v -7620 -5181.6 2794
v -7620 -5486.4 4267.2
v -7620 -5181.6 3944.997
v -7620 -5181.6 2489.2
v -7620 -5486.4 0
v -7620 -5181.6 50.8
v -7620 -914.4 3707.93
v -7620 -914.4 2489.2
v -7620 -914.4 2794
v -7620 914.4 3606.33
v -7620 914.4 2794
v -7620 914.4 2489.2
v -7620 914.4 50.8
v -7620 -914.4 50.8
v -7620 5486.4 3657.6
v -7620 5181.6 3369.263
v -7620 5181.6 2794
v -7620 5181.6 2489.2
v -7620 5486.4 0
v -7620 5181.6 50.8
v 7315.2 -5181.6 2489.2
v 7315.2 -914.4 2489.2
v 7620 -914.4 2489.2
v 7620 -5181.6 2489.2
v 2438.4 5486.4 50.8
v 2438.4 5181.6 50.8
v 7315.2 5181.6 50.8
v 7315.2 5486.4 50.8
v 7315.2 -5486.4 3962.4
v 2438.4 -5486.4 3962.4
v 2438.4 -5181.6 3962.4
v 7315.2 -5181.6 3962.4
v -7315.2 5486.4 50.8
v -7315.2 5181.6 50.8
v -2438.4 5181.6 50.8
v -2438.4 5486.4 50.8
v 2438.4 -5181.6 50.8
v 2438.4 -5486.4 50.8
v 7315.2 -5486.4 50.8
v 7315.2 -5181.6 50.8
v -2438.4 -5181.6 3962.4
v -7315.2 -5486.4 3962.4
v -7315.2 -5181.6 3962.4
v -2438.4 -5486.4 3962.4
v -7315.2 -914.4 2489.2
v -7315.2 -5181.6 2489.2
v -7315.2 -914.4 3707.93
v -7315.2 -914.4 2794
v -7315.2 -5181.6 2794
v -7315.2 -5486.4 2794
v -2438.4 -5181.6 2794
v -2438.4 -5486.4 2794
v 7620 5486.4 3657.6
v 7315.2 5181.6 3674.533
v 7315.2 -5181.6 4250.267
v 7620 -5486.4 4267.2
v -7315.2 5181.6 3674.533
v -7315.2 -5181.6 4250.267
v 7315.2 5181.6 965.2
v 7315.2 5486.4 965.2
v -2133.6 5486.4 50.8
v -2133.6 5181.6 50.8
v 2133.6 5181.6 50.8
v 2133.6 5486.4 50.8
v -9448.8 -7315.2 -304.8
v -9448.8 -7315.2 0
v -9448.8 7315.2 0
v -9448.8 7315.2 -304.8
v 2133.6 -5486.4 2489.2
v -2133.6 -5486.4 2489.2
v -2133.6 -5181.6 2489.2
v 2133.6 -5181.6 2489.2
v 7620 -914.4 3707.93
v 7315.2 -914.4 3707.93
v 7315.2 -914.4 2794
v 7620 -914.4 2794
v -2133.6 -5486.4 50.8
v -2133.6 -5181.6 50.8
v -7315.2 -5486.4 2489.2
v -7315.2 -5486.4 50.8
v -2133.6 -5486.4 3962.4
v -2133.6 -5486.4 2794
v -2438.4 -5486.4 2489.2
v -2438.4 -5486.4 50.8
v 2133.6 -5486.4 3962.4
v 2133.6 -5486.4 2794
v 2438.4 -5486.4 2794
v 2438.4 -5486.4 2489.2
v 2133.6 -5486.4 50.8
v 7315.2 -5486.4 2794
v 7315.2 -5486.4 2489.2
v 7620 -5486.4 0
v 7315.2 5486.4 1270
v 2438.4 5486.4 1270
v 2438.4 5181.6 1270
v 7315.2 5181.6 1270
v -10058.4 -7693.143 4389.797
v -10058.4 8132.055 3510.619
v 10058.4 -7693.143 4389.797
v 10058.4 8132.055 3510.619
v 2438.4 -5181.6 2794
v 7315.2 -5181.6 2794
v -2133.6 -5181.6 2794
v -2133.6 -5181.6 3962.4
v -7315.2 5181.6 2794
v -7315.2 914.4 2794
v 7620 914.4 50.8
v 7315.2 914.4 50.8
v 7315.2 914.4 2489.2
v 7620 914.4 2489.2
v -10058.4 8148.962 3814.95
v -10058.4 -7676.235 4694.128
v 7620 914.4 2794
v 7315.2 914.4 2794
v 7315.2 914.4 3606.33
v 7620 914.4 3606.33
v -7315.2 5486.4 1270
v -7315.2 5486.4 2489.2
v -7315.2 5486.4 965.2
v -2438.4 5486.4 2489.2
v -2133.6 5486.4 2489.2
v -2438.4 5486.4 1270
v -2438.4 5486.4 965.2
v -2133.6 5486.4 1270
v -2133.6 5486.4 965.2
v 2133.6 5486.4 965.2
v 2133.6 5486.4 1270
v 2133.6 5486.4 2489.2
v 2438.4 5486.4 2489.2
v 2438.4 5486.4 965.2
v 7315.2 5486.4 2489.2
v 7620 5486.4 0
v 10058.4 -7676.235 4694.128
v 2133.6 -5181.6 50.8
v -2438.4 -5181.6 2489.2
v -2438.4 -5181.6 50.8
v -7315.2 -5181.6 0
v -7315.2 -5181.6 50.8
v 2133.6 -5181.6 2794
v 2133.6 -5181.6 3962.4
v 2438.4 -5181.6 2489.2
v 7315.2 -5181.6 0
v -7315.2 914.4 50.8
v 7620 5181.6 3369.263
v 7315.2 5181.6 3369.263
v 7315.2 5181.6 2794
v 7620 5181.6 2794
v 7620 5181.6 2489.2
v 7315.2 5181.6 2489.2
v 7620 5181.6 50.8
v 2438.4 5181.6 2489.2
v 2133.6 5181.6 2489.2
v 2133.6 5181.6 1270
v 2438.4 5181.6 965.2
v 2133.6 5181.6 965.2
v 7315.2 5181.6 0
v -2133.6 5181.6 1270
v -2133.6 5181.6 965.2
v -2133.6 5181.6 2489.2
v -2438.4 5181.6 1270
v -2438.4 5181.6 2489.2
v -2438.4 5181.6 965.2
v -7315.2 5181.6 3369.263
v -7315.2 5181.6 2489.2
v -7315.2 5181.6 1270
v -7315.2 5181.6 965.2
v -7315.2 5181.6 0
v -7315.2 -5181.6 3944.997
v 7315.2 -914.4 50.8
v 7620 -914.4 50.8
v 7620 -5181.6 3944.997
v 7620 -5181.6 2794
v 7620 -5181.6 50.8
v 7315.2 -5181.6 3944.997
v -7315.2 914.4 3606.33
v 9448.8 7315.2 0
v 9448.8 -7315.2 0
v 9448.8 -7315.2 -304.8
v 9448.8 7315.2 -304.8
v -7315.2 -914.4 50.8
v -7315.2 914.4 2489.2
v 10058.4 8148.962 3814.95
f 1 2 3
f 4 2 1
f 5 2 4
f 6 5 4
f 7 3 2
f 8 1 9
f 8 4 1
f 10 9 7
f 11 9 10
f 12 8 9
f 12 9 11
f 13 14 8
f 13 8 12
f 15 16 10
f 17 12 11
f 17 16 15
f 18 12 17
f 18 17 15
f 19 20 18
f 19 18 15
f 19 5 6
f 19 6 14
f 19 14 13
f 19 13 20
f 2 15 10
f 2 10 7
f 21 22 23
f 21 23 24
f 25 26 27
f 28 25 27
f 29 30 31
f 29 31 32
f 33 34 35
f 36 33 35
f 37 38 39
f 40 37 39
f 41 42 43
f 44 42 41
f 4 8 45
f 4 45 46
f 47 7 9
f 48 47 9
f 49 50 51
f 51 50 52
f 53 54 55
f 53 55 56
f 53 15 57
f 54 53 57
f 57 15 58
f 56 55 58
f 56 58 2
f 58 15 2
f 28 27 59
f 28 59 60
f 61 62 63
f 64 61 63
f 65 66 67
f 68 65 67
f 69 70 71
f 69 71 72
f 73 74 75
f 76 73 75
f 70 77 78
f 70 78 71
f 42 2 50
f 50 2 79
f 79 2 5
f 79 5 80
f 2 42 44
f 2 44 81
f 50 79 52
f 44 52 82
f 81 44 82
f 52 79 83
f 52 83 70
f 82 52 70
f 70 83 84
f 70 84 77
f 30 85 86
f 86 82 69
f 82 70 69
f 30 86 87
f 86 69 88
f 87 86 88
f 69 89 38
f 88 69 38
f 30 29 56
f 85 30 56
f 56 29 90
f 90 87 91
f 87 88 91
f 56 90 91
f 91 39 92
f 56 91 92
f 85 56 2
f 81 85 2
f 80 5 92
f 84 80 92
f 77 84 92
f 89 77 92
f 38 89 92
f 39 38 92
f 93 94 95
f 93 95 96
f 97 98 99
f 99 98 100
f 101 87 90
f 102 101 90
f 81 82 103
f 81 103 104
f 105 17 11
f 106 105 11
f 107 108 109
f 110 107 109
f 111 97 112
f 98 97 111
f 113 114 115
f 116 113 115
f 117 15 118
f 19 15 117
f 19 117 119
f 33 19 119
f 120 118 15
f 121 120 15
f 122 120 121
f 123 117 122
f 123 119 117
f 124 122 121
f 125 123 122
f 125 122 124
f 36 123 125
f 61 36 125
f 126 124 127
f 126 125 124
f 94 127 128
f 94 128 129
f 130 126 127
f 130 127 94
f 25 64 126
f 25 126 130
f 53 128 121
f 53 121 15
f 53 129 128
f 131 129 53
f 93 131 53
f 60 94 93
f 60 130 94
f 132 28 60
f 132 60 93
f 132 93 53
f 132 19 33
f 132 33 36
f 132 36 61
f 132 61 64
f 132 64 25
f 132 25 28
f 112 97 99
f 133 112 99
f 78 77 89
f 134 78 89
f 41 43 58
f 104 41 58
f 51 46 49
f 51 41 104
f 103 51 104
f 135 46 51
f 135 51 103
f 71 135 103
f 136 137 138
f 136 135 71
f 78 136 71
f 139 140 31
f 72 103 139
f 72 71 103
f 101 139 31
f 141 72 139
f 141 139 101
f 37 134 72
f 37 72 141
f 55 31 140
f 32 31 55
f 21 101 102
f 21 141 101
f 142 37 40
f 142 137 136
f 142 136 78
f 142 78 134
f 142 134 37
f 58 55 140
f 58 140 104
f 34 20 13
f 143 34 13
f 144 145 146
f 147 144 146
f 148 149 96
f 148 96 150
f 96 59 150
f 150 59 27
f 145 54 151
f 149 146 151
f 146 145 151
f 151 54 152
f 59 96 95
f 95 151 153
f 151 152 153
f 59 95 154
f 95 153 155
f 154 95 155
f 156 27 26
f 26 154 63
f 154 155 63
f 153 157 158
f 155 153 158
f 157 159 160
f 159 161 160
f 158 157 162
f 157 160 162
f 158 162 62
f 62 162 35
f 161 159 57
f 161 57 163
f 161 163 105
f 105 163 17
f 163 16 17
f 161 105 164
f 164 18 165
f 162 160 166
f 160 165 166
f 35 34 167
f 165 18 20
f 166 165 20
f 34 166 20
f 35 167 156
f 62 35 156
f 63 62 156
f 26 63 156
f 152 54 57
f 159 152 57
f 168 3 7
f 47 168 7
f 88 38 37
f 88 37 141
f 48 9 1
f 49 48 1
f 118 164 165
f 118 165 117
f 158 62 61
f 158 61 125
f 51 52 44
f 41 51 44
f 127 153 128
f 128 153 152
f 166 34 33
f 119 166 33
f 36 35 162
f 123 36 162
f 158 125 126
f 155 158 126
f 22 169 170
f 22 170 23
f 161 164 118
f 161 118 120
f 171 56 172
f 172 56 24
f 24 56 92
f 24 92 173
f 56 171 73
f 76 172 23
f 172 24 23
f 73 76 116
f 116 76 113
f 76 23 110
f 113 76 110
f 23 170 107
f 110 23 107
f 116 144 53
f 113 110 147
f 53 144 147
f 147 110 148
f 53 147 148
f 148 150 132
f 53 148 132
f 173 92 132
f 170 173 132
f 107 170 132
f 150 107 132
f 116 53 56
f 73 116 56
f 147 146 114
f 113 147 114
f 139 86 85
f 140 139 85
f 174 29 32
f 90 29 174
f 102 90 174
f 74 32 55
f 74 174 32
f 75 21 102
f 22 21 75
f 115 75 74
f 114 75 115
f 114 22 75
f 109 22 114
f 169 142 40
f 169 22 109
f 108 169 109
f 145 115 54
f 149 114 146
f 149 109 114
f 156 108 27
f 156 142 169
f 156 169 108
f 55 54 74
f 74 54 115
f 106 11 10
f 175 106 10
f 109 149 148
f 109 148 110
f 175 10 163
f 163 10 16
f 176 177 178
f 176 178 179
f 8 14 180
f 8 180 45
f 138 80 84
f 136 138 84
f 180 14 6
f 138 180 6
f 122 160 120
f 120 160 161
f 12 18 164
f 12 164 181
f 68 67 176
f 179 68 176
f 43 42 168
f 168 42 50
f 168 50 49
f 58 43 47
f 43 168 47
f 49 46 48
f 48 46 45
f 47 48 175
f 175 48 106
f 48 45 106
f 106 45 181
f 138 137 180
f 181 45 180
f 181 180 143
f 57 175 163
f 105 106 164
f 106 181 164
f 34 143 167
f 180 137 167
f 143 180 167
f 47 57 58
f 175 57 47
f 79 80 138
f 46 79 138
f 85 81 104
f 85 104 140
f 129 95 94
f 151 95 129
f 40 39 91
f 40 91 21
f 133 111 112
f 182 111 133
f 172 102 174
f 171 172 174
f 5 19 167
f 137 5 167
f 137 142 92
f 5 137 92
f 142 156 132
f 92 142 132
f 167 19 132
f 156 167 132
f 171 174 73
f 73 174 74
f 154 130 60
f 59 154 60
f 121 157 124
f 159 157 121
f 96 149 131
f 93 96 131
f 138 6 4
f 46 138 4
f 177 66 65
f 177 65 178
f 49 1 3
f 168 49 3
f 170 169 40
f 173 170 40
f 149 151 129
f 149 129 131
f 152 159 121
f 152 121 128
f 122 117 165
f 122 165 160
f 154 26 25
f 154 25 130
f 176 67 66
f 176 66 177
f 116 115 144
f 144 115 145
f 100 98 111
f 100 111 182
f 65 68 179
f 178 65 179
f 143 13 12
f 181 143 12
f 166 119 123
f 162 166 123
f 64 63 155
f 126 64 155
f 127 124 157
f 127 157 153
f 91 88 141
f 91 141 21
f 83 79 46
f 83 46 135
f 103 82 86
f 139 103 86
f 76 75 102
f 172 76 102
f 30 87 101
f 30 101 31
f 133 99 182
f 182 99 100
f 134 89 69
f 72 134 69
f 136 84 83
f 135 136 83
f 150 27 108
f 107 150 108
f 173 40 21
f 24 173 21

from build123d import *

# Parameters (mm, degrees)
F0_W      = 18897.6
F0_H      = 14630.4
F1_DEPTH  = 304.8
F2_W      = 15240
F2_H      = 10972.8
F3_DEPTH  = 4267.2
F5_DEPTH  = 15240
F6_T      = -304.8
F7_W      = 20116.8
F7_H      = 15849.6
F7_W_2    = 15240
F7_H_2    = 10989.7202876142
F7_W_3    = 14630.4
F7_H_3    = 10379.1802716357
F8_DEPTH  = 304.8
F9_W      = 4267.2
F9_H      = 2438.4
F9_W_2    = 4876.8
F10_DEPTH = 10972.8
F11_W     = 4267.2
F11_H     = 2438.4
F12_DEPTH = 15240
F13_W     = 4876.8
F13_H     = 1168.4
F13_W_2   = 4267.2
F14_DEPTH = 304.8
F16_DEPTH = 15240
F18_W     = 4876.8
F18_H     = 304.8000000003
F18_W_2   = 4267.2
F19_DEPTH = 304.8


with BuildPart() as f1:
    # F0 (on Top) → F1 (new body)
    with BuildSketch(Plane.XY):
        Rectangle(F0_W, F0_H)
    extrude(amount=-F1_DEPTH)


with BuildPart() as f3:
    # F2 (on face) → F3 (new body)
    with BuildSketch(Plane.XY):
        Rectangle(F2_W, F2_H)
    extrude(amount=F3_DEPTH)

    # F4 (on face) → F5 (cut, through all)
    with BuildSketch(Plane(origin=(-7620, 0, 0), x_dir=(0, -1, 0), z_dir=(-1, 0, 0))):
        Polygon((-5486.4, 4267.2), (-5486.4, 3657.6), (5486.4, 4267.2), align=None)
    extrude(amount=-F5_DEPTH, mode=Mode.SUBTRACT)

    # F6
    f6_openings = [f3.faces().sort_by_distance(p)[0] for p in [
        (0, 0, 3962.4),
        (0, 0, 0),
    ]]
    offset(amount=F6_T, openings=f6_openings)

    # F9 (on face) → F10 (cut, through all)
    with BuildSketch(Plane.XZ.offset(5486.4)):
        with Locations((0, 1270)):
            Rectangle(F9_W, F9_H)
        with Locations((4876.8, 1270)):
            Rectangle(F9_W_2, F9_H)
        with Locations((-4876.8, 1270)):
            Rectangle(F9_W_2, F9_H)
    extrude(amount=-F10_DEPTH, mode=Mode.SUBTRACT)

    # F11 (on face) → F12 (cut, through all)
    with BuildSketch(Plane(origin=(-7620, 0, 0), x_dir=(0, -1, 0), z_dir=(-1, 0, 0))):
        with Locations((-3048, 1270)):
            Rectangle(F11_W, F11_H)
        with Locations((3048, 1270)):
            Rectangle(F11_W, F11_H)
    extrude(amount=-F12_DEPTH, mode=Mode.SUBTRACT)

    # F13 (on face) → F14 (cut, through all)
    with BuildSketch(Plane.XZ.offset(5486.4)):
        with Locations((4876.8, 3378.2)):
            Rectangle(F13_W, F13_H)
        with Locations((0, 3378.2)):
            Rectangle(F13_W_2, F13_H)
        with Locations((-4876.8, 3378.2)):
            Rectangle(F13_W, F13_H)
    extrude(amount=-F14_DEPTH, mode=Mode.SUBTRACT)

    # F15 (on face) → F16 (cut, through all)
    with BuildSketch(Plane(origin=(-7620, 0, 0), x_dir=(0, -1, 0), z_dir=(-1, 0, 0))):
        Polygon((-5181.6, 2794), (-914.4, 2794), (-914.4, 3606.3299920107), (-5181.6, 3369.263325344), align=None)
        Polygon((914.4, 2794), (5181.6, 2794), (5181.6, 3944.9966586774), (914.4, 3707.9299920107), align=None)
    extrude(amount=-F16_DEPTH, mode=Mode.SUBTRACT)

    # F18 (on offset) → F19 (join)
    with BuildSketch(Plane.XY.offset(965.2)):
        with Locations((4876.8, 5334.0000000002)):
            Rectangle(F18_W, F18_H)
        with Locations((0, 5334.0000000002)):
            Rectangle(F18_W_2, F18_H)
        with Locations((-4876.8, 5334.0000000002)):
            Rectangle(F18_W, F18_H)
    extrude(amount=F19_DEPTH)


with BuildPart() as f8:
    # F7 (on face) → F8 (new body)
    with BuildSketch(Plane(origin=(0, 219.456, 3950.208), x_dir=(1, 0, 0), z_dir=(0, 0.0554700196, 0.9984603532))):
        Rectangle(F7_W, F7_H)
        with Locations((0, -219.7944057523)):
            Rectangle(F7_W_2, F7_H_2, mode=Mode.SUBTRACT)
        with Locations((0, -219.7944057523)):
            Rectangle(F7_W_2, F7_H_2)
        with Locations((0, -219.7944057523)):
            Rectangle(F7_W_3, F7_H_3, mode=Mode.SUBTRACT)
        with Locations((0, -219.7944057523)):
            Rectangle(F7_W_3, F7_H_3)
    extrude(amount=F8_DEPTH)


solid = Compound([f1.part, f3.part, f8.part])
